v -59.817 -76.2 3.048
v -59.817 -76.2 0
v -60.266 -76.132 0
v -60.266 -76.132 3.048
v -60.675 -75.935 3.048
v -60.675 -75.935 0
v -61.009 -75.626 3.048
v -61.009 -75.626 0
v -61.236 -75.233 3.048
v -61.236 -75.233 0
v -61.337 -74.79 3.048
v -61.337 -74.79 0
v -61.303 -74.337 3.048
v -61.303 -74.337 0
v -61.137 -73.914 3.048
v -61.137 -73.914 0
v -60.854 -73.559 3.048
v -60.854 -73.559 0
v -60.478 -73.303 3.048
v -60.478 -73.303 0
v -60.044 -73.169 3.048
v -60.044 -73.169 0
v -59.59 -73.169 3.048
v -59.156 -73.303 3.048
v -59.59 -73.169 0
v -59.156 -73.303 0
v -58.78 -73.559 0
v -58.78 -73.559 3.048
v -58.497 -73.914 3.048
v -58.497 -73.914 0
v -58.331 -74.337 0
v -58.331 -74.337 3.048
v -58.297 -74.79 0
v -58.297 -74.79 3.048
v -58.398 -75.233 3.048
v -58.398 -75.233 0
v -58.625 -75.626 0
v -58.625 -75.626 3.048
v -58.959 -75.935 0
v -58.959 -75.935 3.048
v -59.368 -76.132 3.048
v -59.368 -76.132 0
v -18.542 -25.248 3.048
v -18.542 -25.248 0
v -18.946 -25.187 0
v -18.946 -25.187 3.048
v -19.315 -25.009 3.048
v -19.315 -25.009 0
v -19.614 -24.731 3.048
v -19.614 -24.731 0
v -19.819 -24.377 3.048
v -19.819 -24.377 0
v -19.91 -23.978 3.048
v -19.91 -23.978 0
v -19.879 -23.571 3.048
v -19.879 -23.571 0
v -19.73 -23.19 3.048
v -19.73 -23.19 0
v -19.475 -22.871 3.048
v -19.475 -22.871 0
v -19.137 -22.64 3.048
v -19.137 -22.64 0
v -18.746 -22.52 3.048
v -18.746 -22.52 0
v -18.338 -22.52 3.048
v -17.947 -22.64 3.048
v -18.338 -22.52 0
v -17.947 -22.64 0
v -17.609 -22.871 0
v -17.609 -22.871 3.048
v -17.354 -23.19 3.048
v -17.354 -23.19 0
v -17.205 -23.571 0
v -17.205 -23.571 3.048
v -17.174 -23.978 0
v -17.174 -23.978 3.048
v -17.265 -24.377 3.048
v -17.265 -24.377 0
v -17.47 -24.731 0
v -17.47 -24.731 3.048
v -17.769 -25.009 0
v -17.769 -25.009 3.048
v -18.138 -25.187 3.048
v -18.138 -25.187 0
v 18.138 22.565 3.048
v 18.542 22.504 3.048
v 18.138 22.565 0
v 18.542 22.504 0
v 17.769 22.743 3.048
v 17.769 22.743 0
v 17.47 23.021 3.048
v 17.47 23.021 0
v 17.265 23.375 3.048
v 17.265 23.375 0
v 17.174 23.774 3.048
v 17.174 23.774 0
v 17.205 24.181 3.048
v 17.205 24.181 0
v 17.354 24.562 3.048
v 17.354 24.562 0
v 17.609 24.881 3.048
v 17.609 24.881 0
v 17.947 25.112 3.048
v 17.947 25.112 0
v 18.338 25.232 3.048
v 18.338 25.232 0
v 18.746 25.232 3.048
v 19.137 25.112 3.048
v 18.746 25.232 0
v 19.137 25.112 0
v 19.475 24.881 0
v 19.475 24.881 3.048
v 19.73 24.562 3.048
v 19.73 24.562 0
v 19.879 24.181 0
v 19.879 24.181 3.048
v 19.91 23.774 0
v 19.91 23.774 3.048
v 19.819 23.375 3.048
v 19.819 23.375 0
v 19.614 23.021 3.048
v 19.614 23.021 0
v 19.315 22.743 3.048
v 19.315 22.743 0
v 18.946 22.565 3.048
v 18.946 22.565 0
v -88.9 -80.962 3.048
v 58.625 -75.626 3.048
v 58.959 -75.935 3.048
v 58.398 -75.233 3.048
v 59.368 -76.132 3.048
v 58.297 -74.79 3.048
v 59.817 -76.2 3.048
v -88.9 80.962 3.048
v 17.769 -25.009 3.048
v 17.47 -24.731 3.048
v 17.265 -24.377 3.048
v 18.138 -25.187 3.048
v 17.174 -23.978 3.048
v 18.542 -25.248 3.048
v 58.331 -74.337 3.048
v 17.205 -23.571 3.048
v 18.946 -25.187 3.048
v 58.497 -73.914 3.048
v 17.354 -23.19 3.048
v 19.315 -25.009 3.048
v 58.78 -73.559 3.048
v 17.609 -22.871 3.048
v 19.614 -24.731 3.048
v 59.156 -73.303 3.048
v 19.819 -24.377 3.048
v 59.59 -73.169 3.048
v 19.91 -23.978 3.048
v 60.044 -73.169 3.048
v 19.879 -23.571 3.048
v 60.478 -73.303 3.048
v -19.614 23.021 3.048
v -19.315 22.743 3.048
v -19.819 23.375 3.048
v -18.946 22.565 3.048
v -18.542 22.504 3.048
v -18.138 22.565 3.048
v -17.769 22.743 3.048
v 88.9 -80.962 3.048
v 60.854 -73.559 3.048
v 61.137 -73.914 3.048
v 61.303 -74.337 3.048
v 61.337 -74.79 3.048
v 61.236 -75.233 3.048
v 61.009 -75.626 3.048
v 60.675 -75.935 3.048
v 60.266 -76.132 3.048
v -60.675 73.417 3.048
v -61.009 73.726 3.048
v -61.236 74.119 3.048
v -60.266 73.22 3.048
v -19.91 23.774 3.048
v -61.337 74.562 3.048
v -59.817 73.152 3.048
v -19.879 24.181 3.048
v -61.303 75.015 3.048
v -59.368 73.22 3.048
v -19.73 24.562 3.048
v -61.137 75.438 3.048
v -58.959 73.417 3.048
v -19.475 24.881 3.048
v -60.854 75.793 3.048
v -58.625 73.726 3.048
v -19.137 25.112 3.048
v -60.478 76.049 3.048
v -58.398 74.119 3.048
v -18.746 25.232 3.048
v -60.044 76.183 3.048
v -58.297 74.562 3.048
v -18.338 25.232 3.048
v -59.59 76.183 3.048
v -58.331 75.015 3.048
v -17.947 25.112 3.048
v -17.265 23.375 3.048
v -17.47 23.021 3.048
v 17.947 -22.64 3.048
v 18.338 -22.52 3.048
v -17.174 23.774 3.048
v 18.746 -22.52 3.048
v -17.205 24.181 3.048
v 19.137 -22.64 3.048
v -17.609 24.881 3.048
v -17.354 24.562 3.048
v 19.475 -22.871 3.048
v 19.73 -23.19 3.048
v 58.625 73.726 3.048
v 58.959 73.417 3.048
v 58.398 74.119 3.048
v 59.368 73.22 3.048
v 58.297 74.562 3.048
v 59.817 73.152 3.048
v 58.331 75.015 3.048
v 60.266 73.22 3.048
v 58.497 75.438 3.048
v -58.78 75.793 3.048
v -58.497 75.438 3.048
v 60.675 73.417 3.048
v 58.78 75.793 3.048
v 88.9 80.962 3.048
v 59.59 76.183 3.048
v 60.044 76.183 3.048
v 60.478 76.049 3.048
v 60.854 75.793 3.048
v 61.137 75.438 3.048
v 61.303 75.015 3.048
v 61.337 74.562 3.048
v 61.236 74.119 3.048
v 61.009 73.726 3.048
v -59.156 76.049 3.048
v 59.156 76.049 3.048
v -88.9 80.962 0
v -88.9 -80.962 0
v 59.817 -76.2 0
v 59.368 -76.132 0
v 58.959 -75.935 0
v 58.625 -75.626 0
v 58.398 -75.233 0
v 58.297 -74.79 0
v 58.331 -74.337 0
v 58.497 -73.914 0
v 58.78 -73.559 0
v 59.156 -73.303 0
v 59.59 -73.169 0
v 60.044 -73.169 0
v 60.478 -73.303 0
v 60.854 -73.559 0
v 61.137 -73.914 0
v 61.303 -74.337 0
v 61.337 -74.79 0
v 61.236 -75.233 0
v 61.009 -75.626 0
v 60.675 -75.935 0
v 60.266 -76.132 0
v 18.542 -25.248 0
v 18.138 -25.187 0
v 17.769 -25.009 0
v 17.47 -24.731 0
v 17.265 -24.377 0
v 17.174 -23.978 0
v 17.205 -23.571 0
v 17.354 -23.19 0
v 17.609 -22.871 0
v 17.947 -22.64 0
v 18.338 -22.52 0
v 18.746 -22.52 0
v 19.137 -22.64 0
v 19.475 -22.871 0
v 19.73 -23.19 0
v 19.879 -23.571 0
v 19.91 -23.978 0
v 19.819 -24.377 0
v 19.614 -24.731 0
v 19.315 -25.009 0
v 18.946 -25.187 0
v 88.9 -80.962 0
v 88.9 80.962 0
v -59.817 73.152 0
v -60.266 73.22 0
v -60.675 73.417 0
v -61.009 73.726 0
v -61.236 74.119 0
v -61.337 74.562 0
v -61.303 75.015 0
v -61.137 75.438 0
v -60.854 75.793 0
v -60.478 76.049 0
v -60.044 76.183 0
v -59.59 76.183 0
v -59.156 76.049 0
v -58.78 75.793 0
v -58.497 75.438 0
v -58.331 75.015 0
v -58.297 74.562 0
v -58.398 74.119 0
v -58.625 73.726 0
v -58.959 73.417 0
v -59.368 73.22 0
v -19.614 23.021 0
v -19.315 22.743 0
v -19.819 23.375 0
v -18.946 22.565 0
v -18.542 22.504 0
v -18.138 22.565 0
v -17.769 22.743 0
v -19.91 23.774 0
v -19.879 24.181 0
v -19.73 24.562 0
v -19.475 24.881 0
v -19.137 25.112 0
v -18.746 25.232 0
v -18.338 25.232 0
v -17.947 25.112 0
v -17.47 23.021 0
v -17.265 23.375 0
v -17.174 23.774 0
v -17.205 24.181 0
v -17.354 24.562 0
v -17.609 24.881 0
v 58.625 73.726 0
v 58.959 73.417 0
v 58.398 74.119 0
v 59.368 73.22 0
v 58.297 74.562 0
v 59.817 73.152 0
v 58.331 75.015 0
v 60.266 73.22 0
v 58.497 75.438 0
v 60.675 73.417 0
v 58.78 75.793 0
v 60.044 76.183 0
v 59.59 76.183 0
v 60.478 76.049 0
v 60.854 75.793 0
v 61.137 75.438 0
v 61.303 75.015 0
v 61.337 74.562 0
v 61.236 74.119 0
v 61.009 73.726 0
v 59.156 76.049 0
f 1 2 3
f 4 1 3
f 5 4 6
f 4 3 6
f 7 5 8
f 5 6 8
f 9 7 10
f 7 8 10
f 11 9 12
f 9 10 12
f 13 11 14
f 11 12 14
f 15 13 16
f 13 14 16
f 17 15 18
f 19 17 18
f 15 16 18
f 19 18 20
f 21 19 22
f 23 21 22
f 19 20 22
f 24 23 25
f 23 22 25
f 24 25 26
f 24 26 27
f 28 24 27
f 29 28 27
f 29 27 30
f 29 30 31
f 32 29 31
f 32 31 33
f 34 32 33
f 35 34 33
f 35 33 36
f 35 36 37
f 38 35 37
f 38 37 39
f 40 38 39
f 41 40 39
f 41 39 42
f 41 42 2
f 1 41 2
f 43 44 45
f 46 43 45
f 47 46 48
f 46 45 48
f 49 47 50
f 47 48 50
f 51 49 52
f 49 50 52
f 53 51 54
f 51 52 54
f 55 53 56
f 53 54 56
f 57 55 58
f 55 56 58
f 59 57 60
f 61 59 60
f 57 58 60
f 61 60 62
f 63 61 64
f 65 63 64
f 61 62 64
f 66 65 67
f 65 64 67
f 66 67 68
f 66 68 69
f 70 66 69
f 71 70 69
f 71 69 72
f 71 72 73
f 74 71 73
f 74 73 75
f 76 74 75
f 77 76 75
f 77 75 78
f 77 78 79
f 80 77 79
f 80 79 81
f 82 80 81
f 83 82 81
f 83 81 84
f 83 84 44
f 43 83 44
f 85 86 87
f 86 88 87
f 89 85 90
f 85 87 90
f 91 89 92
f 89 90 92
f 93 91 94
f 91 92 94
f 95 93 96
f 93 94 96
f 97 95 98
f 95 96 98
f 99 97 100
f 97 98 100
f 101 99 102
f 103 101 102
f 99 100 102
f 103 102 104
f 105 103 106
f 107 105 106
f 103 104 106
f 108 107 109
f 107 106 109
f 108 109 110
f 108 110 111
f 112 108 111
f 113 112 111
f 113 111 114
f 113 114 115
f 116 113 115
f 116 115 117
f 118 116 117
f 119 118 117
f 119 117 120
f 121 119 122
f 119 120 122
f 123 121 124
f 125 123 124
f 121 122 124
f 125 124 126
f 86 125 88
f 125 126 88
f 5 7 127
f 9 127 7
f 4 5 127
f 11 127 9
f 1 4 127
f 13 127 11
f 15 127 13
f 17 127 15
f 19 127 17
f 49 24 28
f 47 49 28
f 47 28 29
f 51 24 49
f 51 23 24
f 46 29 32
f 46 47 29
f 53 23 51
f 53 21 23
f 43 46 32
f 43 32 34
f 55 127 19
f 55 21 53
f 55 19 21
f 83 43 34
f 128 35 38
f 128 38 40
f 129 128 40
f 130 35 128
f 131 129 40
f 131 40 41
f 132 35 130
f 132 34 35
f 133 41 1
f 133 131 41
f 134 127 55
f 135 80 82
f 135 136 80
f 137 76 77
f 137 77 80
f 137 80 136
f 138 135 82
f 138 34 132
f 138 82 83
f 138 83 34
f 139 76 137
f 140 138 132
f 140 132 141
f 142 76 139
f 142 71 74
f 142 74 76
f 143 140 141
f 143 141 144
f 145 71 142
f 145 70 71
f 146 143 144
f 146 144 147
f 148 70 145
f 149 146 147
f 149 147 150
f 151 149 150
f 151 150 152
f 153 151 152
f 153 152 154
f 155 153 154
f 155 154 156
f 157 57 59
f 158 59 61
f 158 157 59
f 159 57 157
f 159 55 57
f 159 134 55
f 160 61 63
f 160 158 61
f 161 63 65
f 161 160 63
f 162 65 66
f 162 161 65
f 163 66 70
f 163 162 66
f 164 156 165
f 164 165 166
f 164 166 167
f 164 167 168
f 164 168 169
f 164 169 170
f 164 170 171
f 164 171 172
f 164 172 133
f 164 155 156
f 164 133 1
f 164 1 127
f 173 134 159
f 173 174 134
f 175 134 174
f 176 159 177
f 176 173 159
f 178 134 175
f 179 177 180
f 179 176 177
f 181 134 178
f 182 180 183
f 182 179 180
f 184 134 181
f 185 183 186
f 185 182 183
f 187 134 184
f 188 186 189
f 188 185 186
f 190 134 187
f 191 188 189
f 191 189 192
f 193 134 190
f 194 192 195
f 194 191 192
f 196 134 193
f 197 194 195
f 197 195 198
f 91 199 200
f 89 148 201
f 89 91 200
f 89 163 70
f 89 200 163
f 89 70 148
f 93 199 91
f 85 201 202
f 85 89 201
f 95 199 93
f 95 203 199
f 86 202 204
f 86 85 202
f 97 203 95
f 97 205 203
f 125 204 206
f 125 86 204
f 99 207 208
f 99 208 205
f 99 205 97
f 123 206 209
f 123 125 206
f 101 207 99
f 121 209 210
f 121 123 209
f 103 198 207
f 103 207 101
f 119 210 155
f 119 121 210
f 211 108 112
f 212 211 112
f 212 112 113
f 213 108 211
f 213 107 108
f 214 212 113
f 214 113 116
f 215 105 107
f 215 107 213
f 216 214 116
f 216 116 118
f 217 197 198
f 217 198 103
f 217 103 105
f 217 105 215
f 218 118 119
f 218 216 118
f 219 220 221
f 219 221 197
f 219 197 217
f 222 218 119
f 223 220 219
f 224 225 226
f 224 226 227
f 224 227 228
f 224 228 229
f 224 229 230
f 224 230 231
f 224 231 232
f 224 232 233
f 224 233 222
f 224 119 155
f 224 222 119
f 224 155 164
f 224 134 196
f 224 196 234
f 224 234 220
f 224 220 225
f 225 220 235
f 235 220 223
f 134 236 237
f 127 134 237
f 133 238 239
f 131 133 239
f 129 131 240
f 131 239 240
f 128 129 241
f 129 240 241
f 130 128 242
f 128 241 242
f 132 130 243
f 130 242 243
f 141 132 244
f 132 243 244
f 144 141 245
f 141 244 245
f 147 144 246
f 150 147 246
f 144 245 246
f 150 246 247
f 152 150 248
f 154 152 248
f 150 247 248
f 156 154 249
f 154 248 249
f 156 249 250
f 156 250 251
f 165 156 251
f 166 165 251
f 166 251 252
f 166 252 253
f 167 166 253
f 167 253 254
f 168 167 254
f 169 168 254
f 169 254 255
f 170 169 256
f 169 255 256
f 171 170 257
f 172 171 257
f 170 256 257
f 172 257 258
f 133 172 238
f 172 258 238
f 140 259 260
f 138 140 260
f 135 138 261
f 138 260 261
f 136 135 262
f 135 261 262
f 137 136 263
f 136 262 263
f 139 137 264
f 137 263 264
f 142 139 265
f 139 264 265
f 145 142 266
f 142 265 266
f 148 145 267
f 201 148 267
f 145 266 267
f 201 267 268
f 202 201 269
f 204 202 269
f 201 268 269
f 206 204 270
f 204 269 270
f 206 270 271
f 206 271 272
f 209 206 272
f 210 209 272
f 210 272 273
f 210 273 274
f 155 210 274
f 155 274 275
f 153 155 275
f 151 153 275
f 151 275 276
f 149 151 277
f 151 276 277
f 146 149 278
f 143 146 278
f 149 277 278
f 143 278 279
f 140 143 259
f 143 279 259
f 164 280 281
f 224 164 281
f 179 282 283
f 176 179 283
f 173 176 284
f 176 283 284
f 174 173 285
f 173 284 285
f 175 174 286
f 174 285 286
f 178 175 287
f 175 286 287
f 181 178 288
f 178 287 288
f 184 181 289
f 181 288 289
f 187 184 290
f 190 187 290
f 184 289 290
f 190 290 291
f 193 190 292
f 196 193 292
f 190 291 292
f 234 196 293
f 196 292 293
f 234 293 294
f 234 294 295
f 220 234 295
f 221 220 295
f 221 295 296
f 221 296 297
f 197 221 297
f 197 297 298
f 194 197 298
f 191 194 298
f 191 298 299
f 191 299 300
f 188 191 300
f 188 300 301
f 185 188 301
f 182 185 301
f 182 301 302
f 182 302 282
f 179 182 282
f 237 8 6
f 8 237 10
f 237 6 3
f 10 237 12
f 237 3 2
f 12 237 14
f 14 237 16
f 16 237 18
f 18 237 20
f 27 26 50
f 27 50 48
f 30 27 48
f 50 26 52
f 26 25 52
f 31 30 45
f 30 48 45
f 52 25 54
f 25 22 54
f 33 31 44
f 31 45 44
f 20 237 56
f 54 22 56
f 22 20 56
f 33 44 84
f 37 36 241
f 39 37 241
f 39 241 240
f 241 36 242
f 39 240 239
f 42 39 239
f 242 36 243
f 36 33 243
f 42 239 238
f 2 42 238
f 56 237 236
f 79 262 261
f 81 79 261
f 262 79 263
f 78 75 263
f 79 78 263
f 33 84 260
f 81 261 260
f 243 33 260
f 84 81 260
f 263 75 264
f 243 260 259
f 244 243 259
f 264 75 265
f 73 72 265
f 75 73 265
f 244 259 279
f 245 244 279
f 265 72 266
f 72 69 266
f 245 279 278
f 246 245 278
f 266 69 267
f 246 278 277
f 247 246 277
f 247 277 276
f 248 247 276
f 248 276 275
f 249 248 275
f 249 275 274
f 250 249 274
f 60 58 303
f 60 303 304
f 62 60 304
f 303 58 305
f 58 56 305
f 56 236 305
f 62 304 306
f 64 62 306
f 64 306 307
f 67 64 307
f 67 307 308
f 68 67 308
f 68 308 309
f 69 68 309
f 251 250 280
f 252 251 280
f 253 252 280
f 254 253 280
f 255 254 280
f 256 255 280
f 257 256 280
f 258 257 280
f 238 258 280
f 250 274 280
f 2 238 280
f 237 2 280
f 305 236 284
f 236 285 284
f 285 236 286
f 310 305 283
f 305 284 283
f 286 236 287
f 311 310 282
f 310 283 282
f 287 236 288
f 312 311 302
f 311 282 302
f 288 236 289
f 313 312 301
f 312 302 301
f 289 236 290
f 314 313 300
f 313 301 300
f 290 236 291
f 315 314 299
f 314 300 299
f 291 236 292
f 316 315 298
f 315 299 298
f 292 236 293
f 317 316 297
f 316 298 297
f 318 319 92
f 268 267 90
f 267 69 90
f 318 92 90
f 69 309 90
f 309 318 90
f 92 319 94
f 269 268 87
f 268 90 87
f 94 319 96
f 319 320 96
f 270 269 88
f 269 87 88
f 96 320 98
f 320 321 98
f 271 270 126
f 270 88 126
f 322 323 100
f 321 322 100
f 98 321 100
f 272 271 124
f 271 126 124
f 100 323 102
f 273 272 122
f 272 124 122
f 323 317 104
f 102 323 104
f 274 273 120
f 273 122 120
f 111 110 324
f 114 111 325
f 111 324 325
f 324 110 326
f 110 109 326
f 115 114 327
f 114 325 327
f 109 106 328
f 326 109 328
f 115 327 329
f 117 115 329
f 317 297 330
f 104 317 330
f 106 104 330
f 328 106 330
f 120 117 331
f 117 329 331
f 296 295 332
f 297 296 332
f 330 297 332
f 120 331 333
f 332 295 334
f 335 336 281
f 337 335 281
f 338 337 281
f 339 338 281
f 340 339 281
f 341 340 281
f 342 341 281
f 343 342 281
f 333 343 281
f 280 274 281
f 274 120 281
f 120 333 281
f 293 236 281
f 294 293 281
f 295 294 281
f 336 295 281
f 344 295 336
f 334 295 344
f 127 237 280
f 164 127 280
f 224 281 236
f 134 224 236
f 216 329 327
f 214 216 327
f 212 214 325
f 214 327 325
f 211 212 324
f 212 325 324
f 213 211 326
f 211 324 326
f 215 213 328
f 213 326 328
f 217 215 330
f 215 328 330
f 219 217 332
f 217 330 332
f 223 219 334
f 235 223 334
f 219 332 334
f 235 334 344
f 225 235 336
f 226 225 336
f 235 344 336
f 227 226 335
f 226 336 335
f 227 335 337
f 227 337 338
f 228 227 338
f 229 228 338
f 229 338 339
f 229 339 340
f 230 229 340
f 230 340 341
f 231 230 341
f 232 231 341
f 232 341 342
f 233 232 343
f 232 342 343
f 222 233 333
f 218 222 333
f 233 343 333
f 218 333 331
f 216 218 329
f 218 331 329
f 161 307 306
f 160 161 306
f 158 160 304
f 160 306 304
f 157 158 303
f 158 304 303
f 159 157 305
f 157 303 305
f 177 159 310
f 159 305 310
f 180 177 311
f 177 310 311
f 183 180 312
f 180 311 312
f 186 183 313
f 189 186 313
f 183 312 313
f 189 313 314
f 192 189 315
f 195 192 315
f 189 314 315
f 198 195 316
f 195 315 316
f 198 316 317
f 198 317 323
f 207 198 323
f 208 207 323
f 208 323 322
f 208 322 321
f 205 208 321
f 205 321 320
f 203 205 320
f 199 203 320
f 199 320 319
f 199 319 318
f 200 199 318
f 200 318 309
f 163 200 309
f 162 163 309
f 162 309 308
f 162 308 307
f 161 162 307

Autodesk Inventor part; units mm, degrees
ref_plane "YZ Plane" through (0, 0, 0) normal (1, 0, 0) x (0, 1, 0)
ref_plane "XZ Plane" through (0, 0, 0) normal (0, 1, 0) x (-1, 0, 0)
ref_plane "XY Plane" through (0, 0, 0) normal (0, 0, 1) x (1, 0, 0)
sketch "Sketch1" plane through (0, 0, 0) normal (0, 0, 1) x (1, 0, 0)
  line L0 (-88.9, -80.9625) -> (88.9, -80.9625)
  line L1 (88.9, -80.9625) -> (88.9, 80.9625)
  line L2 (88.9, 80.9625) -> (-88.9, 80.9625)
  line L3 (-88.9, 80.9625) -> (-88.9, -80.9625)
  line L4 (-88.9, -80.9625) -> (88.9, 80.9625) construction
  line L5 (88.9, -80.9625) -> (-88.9, 80.9625) construction
  point P0 (0, 0)
  dimension "d0" = 177.8
  dimension "d1" = 161.925
extrude "Extrusion1" add sketch "Sketch1" along normal blind 3.048
sketch "Sketch2" plane through (0, 0, 3.048) normal (0, 0, 1) x (1, 0, 0)
  line L0 (-59.817, -74.676) -> (59.817, -74.676)
  line L1 (59.817, -74.676) -> (59.817, 74.676)
  line L2 (59.817, 74.676) -> (-59.817, 74.676)
  line L3 (-59.817, 74.676) -> (-59.817, -74.676)
  line L4 (-59.817, -74.676) -> (59.817, 74.676) construction
  line L5 (59.817, -74.676) -> (-59.817, 74.676) construction
  point P0 (0, 0)
  dimension "d4" = 119.634
  dimension "d5" = 149.352
hole "Hole1" at (-59.817, 74.676, 3.048) at (-59.817, -74.676, 3.048) at (59.817, -74.676, 3.048) at (59.817, 74.676, 3.048) direction (0, 0, -1) diameter 3.048 end through all
sketch "Sketch3" plane through (0, 0, 3.048) normal (0, 0, 1) x (1, 0, 0)
  line L0 (-18.542, -23.876) -> (18.542, -23.876)
  line L1 (18.542, -23.876) -> (18.542, 23.876)
  line L2 (18.542, 23.876) -> (-18.542, 23.876)
  line L3 (-18.542, 23.876) -> (-18.542, -23.876)
  line L4 (-18.542, -23.876) -> (18.542, 23.876) construction
  line L5 (18.542, -23.876) -> (-18.542, 23.876) construction
  point P0 (0, 0)
  dimension "d13" = 37.084
  dimension "d14" = 47.752
hole "Hole2" at (-18.542, 23.876, 3.048) at (18.542, 23.876, 3.048) at (18.542, -23.876, 3.048) at (-18.542, -23.876, 3.048) direction (0, 0, -1) diameter 2.7432 end through all
properties part number "side plate"
